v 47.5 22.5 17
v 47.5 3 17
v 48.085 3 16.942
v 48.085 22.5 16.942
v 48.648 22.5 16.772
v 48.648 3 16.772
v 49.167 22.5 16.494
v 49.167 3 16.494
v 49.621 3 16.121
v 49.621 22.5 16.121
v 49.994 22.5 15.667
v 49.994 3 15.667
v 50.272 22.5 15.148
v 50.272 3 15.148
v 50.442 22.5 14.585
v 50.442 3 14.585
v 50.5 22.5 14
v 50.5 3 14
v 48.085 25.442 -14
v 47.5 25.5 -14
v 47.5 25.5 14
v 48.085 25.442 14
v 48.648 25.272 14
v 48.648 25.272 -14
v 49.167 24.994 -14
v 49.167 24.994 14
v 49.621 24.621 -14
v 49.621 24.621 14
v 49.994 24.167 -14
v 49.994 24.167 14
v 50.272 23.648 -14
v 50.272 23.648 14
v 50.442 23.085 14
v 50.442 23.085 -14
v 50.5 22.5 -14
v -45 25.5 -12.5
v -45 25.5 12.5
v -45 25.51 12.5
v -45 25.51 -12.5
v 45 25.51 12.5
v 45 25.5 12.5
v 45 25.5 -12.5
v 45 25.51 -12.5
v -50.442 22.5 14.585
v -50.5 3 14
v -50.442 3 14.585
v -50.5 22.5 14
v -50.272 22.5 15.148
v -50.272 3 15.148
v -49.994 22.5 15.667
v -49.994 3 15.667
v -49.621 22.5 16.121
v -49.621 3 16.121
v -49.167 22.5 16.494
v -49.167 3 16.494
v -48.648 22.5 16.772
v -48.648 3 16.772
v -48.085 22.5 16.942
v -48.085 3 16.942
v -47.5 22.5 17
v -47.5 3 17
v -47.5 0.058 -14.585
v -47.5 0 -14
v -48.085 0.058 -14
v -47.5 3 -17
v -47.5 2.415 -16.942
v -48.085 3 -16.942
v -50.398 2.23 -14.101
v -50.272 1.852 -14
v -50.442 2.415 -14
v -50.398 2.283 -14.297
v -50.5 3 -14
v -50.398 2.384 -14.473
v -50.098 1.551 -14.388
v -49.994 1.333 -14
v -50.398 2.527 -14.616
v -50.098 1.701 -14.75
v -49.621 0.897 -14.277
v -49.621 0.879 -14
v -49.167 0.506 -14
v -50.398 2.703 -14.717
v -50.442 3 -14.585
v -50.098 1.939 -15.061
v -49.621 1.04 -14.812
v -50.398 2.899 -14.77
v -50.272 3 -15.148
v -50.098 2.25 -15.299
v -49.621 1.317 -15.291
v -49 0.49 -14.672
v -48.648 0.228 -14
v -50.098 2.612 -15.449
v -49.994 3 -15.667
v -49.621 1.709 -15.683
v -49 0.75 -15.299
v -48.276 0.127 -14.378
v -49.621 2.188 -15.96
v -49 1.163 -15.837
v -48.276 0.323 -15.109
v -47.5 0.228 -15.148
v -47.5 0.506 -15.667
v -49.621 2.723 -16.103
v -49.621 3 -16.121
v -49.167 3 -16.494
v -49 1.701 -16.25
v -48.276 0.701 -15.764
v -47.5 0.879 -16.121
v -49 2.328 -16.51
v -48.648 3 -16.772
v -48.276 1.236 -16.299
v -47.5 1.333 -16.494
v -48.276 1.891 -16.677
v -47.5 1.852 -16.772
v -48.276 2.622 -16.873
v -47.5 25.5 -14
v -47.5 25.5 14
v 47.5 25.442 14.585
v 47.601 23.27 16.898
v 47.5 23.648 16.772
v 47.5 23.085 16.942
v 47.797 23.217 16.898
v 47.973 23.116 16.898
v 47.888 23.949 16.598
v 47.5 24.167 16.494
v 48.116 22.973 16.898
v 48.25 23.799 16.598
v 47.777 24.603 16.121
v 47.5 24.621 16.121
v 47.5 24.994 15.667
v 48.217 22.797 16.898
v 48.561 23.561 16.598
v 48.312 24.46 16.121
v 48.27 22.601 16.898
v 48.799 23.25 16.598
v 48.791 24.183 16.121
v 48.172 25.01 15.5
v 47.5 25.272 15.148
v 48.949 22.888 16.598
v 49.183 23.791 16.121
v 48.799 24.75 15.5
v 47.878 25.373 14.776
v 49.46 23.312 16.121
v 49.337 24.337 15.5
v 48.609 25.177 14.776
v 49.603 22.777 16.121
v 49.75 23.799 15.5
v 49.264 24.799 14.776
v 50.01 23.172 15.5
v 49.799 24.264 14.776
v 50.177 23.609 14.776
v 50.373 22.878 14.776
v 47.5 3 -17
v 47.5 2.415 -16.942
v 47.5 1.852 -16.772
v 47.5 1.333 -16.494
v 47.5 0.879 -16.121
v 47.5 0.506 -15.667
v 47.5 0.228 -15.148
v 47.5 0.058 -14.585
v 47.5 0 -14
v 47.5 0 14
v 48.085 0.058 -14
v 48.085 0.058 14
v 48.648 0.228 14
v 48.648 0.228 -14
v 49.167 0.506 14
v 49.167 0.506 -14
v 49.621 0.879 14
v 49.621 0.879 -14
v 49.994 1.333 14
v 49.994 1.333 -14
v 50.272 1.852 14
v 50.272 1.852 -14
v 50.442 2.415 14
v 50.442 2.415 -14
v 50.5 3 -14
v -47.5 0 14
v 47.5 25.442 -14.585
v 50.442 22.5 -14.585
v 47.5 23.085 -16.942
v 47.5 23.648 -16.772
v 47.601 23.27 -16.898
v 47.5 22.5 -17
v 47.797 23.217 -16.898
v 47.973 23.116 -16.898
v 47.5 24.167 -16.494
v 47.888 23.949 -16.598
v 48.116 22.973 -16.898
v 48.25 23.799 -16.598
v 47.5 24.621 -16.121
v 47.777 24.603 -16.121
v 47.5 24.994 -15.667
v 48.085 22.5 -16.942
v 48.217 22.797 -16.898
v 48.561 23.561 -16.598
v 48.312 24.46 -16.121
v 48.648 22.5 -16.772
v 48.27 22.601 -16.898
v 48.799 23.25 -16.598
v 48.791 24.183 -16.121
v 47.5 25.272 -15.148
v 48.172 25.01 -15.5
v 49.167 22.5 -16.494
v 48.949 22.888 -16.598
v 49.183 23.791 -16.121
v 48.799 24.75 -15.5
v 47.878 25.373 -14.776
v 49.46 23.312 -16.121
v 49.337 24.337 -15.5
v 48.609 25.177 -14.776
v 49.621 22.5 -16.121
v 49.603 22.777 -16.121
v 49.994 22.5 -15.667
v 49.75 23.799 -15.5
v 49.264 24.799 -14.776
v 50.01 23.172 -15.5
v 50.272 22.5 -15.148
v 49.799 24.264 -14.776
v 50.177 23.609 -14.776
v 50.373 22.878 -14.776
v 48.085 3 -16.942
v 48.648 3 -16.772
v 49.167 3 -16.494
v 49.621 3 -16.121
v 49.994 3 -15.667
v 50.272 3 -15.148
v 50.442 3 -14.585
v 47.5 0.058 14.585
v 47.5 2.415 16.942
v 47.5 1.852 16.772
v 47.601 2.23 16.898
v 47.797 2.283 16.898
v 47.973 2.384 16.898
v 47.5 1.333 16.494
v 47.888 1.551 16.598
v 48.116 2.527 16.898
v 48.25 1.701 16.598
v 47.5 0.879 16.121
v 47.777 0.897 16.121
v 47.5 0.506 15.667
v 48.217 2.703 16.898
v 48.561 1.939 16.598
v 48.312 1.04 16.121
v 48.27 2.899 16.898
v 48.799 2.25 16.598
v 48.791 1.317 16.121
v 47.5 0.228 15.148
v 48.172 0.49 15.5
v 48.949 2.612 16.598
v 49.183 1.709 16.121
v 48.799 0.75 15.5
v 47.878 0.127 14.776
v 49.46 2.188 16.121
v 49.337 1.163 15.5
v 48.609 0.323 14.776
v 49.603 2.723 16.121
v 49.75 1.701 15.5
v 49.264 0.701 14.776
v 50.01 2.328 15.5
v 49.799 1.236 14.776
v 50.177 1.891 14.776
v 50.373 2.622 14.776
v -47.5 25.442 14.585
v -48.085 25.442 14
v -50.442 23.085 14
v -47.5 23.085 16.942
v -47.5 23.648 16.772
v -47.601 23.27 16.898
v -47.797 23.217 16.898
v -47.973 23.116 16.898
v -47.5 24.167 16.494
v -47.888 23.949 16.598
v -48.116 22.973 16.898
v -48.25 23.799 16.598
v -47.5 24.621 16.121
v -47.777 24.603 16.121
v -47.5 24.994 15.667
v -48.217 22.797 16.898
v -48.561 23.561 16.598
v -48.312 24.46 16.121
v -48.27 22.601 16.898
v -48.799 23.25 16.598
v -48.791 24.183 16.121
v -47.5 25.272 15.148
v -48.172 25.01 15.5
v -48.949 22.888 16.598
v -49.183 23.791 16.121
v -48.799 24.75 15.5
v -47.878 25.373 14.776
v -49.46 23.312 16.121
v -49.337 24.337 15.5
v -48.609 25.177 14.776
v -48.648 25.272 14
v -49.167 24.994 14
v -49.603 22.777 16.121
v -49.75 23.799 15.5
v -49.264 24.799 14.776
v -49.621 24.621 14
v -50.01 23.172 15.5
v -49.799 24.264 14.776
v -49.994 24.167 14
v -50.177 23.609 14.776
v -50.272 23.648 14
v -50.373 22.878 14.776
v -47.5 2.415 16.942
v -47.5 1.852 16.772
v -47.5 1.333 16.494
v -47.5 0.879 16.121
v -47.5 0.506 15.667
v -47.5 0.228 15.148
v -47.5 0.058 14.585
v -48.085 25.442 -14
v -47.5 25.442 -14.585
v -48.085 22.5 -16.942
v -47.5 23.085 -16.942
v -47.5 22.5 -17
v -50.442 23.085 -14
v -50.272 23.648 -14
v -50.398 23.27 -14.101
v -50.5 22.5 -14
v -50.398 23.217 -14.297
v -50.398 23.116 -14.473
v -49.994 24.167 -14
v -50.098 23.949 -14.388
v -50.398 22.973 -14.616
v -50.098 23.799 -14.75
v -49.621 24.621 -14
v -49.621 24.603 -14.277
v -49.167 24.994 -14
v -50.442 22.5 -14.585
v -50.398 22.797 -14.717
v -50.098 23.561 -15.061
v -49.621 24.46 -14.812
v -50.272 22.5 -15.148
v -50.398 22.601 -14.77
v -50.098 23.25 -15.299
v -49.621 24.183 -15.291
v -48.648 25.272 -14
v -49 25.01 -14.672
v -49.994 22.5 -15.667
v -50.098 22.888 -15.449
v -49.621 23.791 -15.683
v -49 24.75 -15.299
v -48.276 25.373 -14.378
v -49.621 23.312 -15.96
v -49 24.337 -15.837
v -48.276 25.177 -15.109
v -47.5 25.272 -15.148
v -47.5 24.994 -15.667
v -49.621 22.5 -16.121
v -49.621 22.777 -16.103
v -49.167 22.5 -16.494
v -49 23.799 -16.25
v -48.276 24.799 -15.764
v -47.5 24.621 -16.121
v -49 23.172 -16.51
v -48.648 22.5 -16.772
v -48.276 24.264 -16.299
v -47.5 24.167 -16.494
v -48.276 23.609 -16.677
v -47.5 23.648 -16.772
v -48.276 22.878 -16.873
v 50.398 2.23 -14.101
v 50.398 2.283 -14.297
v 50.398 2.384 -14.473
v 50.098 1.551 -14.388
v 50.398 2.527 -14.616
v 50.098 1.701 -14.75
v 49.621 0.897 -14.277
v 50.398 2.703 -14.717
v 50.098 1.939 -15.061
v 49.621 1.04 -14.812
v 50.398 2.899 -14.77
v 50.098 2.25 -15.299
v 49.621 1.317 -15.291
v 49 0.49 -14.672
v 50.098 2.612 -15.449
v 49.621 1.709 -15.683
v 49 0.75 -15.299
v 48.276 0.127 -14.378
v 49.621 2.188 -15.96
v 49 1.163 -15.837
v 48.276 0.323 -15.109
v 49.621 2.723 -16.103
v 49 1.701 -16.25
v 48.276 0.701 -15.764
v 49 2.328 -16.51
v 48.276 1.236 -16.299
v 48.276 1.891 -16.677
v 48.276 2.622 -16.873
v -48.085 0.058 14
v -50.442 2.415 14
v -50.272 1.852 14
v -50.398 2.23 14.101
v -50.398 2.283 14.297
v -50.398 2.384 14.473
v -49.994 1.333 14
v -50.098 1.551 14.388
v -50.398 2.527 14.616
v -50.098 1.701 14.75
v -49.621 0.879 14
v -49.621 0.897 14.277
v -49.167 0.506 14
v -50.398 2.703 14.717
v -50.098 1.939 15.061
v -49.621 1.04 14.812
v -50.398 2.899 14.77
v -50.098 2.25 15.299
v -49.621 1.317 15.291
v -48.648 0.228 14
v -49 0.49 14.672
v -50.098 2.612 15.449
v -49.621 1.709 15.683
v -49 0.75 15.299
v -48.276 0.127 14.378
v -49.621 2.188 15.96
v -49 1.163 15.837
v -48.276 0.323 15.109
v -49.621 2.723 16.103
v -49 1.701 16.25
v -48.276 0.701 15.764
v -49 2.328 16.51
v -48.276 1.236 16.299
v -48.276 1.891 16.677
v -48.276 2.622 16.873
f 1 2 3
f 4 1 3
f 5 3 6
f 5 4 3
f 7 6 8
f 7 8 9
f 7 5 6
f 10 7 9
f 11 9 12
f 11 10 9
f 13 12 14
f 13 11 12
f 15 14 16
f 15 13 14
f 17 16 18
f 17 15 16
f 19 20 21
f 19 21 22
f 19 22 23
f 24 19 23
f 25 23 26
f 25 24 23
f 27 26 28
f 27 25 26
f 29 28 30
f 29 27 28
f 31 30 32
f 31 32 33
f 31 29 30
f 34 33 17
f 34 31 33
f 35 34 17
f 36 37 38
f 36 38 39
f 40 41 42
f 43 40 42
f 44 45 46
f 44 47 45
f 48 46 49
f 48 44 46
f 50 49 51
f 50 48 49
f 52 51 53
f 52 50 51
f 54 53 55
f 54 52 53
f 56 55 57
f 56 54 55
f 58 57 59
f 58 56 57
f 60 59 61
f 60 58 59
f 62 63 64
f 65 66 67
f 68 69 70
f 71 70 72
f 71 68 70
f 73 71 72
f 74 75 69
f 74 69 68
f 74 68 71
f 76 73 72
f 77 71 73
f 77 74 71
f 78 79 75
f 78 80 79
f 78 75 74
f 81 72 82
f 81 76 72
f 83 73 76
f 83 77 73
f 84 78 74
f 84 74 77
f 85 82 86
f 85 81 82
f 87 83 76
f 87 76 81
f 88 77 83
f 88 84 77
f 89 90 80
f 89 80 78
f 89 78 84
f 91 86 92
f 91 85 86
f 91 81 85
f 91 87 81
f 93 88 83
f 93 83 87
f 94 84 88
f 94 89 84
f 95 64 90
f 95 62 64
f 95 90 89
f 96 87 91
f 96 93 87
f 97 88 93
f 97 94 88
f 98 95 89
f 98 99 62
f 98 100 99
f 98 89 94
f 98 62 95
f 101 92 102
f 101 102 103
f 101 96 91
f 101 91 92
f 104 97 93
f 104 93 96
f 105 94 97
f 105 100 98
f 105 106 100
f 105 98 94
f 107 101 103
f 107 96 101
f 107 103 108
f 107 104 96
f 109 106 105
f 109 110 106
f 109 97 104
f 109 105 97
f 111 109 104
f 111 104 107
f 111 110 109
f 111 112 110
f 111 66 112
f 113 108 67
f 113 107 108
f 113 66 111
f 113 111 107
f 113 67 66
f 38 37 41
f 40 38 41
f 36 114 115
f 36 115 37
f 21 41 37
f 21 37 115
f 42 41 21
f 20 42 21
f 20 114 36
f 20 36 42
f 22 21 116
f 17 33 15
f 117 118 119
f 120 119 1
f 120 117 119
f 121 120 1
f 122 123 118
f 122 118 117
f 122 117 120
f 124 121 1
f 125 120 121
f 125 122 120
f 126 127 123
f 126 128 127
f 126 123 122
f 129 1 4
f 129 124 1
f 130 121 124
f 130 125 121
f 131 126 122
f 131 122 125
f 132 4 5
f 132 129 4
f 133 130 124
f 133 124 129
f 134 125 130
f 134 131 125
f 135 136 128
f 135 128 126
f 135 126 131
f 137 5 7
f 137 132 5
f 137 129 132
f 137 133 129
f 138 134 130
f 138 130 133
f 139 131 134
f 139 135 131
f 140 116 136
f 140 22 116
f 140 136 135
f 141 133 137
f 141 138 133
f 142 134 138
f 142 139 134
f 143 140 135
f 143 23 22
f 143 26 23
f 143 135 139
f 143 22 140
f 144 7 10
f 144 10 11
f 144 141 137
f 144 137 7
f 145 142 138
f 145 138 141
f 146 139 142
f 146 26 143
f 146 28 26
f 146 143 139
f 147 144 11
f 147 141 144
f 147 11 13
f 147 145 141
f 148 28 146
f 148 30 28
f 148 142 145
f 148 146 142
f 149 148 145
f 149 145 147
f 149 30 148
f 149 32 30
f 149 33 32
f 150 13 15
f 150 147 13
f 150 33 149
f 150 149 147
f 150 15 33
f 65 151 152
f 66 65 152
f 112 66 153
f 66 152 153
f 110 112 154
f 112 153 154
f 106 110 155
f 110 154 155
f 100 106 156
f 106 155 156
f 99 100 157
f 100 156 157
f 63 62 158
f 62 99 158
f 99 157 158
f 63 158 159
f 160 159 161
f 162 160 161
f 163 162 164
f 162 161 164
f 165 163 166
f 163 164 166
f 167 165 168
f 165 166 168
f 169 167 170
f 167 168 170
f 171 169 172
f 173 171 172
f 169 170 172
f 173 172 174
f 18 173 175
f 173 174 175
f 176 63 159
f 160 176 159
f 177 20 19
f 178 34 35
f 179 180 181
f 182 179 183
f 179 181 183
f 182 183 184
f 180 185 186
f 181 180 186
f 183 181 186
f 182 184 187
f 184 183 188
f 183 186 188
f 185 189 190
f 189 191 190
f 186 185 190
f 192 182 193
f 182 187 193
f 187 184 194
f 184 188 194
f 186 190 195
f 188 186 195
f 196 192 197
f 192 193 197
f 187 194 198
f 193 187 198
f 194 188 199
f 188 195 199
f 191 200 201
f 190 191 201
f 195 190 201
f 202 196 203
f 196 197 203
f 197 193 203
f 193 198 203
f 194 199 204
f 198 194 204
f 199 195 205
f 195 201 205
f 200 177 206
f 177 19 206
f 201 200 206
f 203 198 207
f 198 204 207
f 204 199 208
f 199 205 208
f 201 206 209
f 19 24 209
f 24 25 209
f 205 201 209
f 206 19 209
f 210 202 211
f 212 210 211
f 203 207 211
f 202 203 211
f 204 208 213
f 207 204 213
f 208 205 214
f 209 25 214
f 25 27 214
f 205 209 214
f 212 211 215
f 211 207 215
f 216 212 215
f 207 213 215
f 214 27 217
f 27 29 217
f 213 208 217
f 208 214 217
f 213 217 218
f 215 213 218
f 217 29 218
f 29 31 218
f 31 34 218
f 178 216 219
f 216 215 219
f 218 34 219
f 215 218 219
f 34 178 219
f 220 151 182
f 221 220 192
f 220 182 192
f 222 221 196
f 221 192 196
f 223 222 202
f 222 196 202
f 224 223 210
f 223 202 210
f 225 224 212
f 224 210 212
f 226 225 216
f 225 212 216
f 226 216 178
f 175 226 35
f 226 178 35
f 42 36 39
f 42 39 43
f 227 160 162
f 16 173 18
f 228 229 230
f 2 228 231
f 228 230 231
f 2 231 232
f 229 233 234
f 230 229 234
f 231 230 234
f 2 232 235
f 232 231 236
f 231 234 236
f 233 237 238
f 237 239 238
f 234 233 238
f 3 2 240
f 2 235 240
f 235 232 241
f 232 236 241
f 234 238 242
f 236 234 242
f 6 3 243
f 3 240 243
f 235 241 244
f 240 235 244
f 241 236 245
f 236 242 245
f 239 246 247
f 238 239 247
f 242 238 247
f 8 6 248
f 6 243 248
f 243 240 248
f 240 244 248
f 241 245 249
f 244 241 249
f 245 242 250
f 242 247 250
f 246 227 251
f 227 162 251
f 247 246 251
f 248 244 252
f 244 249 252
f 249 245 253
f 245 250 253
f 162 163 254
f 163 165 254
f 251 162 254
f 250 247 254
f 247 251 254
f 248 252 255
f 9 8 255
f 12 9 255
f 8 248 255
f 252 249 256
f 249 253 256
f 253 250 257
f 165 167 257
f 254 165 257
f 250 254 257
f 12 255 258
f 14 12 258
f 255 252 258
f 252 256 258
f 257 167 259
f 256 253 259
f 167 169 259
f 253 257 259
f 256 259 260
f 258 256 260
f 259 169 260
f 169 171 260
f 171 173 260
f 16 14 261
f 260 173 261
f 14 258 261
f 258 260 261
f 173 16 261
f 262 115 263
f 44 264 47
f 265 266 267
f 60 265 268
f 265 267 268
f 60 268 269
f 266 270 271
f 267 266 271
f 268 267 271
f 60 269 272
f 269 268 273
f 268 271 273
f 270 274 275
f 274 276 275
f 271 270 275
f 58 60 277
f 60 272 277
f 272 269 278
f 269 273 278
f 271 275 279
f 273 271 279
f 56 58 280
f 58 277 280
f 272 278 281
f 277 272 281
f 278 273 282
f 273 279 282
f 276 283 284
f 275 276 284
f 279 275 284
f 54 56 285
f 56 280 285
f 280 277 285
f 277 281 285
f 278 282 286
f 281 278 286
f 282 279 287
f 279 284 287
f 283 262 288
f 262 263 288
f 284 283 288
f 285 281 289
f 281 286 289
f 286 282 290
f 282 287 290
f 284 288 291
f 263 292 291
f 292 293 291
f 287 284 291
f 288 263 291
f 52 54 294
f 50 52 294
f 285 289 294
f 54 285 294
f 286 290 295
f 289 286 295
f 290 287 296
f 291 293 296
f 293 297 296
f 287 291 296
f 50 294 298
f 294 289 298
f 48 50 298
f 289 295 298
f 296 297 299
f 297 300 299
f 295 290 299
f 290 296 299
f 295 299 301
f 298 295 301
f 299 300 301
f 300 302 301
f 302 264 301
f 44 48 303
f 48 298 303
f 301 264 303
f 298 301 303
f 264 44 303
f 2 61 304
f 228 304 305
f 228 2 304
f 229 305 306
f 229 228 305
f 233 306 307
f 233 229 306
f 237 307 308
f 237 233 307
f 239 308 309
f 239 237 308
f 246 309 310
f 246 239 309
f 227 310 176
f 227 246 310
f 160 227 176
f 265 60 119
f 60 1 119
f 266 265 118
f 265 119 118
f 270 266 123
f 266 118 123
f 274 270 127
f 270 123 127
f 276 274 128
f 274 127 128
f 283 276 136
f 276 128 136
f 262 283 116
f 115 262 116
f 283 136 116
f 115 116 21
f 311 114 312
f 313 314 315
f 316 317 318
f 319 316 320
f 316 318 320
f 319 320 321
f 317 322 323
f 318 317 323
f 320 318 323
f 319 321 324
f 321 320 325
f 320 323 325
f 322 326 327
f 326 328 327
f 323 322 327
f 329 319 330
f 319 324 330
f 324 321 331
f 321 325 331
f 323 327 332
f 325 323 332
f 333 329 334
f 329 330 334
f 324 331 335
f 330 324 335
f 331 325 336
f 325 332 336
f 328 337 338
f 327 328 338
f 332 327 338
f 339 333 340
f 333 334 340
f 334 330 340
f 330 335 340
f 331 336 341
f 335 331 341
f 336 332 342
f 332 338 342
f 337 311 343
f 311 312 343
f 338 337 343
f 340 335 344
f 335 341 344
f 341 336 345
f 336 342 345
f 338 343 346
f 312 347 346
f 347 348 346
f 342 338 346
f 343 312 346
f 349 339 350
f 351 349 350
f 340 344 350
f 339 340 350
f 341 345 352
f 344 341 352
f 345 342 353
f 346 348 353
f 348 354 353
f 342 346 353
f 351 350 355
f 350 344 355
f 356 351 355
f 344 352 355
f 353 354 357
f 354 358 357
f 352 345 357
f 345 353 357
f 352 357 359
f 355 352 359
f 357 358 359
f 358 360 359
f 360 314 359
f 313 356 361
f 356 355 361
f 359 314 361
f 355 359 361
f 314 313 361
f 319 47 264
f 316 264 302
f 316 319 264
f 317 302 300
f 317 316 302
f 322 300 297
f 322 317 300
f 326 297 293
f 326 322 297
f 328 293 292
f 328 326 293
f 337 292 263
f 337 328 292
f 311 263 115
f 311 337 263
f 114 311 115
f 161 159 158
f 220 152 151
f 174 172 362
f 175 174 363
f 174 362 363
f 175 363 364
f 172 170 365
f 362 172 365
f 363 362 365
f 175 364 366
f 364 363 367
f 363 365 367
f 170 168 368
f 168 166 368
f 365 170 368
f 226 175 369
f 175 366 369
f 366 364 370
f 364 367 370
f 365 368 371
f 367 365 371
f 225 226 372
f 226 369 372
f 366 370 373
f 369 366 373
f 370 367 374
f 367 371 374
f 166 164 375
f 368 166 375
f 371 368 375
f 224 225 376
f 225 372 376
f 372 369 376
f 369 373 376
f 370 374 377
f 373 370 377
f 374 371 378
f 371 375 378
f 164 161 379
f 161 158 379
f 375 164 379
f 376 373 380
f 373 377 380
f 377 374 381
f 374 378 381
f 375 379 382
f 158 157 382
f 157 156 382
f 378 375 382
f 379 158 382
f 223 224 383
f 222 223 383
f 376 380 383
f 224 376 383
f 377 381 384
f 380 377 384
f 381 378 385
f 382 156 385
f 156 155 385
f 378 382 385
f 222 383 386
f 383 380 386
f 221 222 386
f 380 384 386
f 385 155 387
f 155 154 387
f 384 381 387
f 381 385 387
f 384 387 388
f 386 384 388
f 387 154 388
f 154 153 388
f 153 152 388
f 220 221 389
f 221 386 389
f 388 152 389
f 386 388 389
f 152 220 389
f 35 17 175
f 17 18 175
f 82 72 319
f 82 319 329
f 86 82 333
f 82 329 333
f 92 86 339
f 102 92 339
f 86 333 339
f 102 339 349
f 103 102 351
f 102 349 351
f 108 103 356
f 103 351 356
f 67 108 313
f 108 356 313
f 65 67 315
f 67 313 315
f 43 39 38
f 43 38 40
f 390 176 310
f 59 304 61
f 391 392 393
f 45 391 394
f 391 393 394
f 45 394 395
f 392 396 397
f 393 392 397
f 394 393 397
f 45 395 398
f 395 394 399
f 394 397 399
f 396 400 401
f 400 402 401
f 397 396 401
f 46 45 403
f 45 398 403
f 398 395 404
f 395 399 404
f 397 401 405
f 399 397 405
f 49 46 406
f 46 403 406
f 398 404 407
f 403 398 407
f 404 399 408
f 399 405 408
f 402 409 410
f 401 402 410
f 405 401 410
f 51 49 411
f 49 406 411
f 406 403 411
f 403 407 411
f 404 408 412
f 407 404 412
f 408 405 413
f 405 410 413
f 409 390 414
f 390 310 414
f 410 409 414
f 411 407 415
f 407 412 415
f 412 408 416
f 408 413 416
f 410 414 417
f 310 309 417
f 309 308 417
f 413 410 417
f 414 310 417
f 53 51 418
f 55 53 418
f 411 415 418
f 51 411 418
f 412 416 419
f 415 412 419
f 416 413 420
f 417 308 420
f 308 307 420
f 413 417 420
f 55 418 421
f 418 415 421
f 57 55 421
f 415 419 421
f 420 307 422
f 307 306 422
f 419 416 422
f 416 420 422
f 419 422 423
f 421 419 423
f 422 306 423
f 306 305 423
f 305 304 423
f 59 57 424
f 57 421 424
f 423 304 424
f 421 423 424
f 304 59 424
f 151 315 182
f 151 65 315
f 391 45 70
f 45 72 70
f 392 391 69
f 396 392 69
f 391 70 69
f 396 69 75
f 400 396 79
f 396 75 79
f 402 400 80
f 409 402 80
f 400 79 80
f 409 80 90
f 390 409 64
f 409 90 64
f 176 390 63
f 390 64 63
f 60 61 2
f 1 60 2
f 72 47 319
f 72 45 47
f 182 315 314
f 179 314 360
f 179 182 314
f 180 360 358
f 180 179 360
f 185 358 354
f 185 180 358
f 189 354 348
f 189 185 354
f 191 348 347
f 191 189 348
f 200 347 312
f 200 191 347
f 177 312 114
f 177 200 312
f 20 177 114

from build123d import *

# Parameters (mm, degrees)
SKETCH1_W           = 101
SKETCH1_H           = 34
BOSS_EXTRUDE1_DEPTH = 25.5
SKETCH2_W           = 90
SKETCH2_H           = 25
BOSS_EXTRUDE2_DEPTH = 0.01
FILLET1_R           = 3


with BuildPart() as part:
    # Sketch1 → Boss-Extrude1 (new body)
    with BuildSketch(Plane(origin=(0, 0, 0), x_dir=(1, 0, 0), z_dir=(0, 1, 0))):
        Rectangle(SKETCH1_W, SKETCH1_H)
    extrude(amount=BOSS_EXTRUDE1_DEPTH)

    # Sketch2 → Boss-Extrude2 (add)
    with BuildSketch(Plane(origin=(0, 25.5, 0), x_dir=(1, 0, 0), z_dir=(0, 1, 0))):
        Rectangle(SKETCH2_W, SKETCH2_H)
    extrude(amount=BOSS_EXTRUDE2_DEPTH)

    # Fillet1
    fillet1_edges = [part.edges().sort_by_distance(p)[0] for p in [
        (50.5, 25.5, 0),
        (0, 25.5, -17),
        (-50.5, 25.5, 0),
        (0, 0, -17),
        (50.5, 0, 0),
        (0, 0, 17),
        (-50.5, 0, 0),
        (0, 25.5, 17),
        (-50.5, 12.75, -17),
        (50.5, 12.75, -17),
        (50.5, 12.75, 17),
        (-50.5, 12.75, 17),
    ]]
    fillet(fillet1_edges, radius=FILLET1_R)


solid = part.part
